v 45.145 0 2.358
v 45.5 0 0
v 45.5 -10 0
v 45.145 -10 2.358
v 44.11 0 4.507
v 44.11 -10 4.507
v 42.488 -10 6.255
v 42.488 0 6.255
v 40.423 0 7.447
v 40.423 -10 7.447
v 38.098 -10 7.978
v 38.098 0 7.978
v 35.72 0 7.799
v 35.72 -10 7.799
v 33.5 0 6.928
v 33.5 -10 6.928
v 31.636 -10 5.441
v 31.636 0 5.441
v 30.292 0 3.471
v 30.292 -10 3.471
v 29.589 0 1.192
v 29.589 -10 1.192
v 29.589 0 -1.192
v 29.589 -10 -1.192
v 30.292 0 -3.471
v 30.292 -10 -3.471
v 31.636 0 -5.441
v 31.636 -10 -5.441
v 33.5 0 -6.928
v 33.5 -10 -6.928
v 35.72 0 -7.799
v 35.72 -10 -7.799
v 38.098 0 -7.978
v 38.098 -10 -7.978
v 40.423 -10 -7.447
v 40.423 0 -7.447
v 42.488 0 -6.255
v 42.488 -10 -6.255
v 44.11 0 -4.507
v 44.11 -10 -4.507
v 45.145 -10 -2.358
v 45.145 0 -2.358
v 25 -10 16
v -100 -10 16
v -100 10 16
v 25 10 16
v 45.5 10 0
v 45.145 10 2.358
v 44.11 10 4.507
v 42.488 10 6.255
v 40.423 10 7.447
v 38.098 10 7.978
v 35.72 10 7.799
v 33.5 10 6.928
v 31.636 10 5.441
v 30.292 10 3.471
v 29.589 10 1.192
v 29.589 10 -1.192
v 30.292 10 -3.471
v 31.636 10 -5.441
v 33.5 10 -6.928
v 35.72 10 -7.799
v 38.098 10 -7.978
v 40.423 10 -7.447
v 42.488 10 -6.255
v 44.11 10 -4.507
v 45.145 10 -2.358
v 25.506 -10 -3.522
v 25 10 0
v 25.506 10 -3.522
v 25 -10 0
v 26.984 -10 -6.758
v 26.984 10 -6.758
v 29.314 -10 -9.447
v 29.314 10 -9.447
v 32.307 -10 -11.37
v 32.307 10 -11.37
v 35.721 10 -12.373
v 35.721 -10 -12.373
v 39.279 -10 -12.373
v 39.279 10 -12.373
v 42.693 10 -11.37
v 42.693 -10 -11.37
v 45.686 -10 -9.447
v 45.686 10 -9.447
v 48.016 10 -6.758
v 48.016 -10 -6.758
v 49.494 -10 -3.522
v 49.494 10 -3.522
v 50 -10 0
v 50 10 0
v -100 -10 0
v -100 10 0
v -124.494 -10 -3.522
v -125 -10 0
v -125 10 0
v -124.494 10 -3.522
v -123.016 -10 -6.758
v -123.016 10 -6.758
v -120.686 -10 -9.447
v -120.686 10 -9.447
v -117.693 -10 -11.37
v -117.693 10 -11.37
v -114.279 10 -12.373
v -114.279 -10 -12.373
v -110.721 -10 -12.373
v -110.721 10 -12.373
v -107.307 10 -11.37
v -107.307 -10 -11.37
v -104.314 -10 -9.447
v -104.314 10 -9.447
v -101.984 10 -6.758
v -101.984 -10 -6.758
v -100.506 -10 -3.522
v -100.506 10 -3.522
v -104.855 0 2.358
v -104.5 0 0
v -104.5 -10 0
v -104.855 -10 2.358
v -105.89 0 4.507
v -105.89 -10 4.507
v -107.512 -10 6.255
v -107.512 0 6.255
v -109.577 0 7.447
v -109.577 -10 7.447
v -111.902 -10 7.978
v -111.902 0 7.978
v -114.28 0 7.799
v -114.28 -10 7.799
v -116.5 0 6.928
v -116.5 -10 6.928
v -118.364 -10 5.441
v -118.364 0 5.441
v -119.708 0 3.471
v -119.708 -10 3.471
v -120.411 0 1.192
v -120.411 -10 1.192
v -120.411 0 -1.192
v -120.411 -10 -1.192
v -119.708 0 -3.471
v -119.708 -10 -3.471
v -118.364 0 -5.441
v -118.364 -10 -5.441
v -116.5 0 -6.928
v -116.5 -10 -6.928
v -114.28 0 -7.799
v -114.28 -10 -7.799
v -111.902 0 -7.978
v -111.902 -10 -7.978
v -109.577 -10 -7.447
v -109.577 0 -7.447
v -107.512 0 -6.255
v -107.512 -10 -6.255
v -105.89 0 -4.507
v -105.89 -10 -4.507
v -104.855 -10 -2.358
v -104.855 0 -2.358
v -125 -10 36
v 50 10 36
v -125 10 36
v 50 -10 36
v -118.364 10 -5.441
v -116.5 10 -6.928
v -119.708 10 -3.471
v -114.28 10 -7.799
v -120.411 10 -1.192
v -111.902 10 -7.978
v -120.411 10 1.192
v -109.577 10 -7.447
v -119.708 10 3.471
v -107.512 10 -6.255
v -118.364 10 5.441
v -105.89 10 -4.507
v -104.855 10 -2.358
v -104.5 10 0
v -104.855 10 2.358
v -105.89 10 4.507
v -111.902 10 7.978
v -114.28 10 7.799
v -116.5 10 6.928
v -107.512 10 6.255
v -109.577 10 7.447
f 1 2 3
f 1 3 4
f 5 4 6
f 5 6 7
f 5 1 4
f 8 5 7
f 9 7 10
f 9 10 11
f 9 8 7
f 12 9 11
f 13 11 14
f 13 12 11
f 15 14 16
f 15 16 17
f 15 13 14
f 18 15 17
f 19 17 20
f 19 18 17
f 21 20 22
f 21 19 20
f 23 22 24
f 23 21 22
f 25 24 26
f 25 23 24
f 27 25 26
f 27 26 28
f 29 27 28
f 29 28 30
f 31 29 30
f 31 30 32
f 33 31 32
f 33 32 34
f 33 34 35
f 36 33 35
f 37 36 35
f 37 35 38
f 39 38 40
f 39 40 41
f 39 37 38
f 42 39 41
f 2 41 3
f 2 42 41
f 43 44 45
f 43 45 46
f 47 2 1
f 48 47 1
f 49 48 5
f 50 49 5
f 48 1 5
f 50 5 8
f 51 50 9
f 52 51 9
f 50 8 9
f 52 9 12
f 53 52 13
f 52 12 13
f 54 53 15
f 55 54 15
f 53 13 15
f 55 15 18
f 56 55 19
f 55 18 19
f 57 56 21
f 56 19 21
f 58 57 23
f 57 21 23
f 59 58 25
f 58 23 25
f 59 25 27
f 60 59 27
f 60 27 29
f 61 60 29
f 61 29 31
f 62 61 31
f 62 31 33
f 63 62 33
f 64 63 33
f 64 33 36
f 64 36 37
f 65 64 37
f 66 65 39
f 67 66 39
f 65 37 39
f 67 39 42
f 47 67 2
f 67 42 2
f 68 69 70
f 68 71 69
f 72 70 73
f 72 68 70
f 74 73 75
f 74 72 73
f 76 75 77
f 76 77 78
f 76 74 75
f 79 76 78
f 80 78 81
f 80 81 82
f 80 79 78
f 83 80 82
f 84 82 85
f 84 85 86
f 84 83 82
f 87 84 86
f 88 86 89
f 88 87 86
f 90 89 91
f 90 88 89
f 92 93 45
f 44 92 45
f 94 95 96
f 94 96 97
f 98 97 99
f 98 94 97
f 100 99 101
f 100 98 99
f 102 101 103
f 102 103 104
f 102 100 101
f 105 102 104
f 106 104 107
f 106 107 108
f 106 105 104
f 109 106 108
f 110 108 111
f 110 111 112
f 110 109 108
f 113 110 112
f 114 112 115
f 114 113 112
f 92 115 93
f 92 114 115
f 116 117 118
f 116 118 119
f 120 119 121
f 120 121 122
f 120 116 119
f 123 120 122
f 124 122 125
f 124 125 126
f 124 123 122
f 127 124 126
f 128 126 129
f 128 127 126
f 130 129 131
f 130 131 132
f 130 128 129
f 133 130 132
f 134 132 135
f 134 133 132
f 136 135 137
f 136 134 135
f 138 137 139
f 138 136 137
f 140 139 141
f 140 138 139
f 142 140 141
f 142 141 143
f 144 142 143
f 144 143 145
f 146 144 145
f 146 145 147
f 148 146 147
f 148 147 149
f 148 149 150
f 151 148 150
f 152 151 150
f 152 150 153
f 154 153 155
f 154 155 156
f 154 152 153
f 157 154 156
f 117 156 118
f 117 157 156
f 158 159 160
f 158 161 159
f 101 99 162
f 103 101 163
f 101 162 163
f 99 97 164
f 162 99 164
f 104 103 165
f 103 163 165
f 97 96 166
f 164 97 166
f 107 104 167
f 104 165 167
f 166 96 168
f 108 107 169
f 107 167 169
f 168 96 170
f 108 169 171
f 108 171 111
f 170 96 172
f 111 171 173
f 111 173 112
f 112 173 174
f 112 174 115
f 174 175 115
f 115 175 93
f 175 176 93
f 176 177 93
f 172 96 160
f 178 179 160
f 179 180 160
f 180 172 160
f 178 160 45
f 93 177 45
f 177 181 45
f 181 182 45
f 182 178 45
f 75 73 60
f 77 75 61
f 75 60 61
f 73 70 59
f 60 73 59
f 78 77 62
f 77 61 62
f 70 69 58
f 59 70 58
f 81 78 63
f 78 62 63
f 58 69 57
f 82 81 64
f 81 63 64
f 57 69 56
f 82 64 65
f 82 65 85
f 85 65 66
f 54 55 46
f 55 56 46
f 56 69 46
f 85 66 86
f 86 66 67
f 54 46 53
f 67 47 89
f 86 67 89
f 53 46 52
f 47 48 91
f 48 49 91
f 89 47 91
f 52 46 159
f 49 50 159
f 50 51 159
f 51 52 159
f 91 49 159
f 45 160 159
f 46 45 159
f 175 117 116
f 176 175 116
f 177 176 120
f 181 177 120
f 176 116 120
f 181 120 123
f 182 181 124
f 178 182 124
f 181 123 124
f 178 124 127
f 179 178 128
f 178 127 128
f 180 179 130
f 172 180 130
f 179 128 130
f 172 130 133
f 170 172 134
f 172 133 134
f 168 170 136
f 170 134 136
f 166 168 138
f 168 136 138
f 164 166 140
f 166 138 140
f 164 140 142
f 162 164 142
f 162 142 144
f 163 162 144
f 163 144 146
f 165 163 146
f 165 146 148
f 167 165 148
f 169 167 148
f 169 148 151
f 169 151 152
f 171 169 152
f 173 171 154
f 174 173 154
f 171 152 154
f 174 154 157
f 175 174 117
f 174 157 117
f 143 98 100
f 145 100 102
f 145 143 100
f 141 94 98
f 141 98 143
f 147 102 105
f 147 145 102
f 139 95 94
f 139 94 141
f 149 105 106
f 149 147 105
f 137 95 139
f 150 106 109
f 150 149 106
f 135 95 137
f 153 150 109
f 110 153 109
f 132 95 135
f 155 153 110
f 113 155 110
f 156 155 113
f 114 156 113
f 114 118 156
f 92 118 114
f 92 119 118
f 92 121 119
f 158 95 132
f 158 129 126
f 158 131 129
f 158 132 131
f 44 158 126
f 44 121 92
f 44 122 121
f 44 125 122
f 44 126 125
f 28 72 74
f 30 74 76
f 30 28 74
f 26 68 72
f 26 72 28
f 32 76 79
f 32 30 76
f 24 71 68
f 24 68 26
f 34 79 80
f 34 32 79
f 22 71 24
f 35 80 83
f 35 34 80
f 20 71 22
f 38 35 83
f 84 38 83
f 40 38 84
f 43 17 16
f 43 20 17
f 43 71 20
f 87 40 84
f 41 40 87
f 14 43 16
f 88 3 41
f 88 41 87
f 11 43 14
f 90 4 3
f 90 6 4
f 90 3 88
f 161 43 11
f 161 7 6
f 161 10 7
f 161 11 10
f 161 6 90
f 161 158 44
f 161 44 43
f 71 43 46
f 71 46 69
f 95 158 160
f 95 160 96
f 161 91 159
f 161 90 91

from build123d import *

# Parameters (mm, degrees)
F1_DEPTH      = 10
F1_DEPTH_BACK = 10
F2_R          = 8
F3_DEPTH      = 10
F3_DEPTH_BACK = 10


with BuildPart() as f1:
    # F0 (on Front) → F1 (new body, two sides)
    with BuildSketch(Plane.XZ) as f1_sk:
        with BuildLine():
            Line((50, 36), (-125, 36))
            Line((-125, 36), (-125, 0))
            ThreePointArc((-125, 0), (-112.5, -12.5), (-100, 0))
            Line((-100, 0), (-100, 16))
            Line((-100, 16), (25, 16))
            Line((25, 16), (25, 0))
            ThreePointArc((25, 0), (37.5, -12.5), (50, 0))
            Line((50, 0), (50, 36))
        make_face()
    extrude(amount=F1_DEPTH)
    extrude(f1_sk.sketch, amount=-F1_DEPTH_BACK)

    # F2 (on Front) → F3 (cut, two sides)
    with BuildSketch(Plane.XZ) as f3_sk:
        with Locations((-112.5, 0)):
            Circle(F2_R)
        with Locations((37.5, 0)):
            Circle(F2_R)
    extrude(amount=F3_DEPTH, mode=Mode.SUBTRACT)
    extrude(f3_sk.sketch, amount=-F3_DEPTH_BACK, mode=Mode.SUBTRACT)


solid = f1.part
